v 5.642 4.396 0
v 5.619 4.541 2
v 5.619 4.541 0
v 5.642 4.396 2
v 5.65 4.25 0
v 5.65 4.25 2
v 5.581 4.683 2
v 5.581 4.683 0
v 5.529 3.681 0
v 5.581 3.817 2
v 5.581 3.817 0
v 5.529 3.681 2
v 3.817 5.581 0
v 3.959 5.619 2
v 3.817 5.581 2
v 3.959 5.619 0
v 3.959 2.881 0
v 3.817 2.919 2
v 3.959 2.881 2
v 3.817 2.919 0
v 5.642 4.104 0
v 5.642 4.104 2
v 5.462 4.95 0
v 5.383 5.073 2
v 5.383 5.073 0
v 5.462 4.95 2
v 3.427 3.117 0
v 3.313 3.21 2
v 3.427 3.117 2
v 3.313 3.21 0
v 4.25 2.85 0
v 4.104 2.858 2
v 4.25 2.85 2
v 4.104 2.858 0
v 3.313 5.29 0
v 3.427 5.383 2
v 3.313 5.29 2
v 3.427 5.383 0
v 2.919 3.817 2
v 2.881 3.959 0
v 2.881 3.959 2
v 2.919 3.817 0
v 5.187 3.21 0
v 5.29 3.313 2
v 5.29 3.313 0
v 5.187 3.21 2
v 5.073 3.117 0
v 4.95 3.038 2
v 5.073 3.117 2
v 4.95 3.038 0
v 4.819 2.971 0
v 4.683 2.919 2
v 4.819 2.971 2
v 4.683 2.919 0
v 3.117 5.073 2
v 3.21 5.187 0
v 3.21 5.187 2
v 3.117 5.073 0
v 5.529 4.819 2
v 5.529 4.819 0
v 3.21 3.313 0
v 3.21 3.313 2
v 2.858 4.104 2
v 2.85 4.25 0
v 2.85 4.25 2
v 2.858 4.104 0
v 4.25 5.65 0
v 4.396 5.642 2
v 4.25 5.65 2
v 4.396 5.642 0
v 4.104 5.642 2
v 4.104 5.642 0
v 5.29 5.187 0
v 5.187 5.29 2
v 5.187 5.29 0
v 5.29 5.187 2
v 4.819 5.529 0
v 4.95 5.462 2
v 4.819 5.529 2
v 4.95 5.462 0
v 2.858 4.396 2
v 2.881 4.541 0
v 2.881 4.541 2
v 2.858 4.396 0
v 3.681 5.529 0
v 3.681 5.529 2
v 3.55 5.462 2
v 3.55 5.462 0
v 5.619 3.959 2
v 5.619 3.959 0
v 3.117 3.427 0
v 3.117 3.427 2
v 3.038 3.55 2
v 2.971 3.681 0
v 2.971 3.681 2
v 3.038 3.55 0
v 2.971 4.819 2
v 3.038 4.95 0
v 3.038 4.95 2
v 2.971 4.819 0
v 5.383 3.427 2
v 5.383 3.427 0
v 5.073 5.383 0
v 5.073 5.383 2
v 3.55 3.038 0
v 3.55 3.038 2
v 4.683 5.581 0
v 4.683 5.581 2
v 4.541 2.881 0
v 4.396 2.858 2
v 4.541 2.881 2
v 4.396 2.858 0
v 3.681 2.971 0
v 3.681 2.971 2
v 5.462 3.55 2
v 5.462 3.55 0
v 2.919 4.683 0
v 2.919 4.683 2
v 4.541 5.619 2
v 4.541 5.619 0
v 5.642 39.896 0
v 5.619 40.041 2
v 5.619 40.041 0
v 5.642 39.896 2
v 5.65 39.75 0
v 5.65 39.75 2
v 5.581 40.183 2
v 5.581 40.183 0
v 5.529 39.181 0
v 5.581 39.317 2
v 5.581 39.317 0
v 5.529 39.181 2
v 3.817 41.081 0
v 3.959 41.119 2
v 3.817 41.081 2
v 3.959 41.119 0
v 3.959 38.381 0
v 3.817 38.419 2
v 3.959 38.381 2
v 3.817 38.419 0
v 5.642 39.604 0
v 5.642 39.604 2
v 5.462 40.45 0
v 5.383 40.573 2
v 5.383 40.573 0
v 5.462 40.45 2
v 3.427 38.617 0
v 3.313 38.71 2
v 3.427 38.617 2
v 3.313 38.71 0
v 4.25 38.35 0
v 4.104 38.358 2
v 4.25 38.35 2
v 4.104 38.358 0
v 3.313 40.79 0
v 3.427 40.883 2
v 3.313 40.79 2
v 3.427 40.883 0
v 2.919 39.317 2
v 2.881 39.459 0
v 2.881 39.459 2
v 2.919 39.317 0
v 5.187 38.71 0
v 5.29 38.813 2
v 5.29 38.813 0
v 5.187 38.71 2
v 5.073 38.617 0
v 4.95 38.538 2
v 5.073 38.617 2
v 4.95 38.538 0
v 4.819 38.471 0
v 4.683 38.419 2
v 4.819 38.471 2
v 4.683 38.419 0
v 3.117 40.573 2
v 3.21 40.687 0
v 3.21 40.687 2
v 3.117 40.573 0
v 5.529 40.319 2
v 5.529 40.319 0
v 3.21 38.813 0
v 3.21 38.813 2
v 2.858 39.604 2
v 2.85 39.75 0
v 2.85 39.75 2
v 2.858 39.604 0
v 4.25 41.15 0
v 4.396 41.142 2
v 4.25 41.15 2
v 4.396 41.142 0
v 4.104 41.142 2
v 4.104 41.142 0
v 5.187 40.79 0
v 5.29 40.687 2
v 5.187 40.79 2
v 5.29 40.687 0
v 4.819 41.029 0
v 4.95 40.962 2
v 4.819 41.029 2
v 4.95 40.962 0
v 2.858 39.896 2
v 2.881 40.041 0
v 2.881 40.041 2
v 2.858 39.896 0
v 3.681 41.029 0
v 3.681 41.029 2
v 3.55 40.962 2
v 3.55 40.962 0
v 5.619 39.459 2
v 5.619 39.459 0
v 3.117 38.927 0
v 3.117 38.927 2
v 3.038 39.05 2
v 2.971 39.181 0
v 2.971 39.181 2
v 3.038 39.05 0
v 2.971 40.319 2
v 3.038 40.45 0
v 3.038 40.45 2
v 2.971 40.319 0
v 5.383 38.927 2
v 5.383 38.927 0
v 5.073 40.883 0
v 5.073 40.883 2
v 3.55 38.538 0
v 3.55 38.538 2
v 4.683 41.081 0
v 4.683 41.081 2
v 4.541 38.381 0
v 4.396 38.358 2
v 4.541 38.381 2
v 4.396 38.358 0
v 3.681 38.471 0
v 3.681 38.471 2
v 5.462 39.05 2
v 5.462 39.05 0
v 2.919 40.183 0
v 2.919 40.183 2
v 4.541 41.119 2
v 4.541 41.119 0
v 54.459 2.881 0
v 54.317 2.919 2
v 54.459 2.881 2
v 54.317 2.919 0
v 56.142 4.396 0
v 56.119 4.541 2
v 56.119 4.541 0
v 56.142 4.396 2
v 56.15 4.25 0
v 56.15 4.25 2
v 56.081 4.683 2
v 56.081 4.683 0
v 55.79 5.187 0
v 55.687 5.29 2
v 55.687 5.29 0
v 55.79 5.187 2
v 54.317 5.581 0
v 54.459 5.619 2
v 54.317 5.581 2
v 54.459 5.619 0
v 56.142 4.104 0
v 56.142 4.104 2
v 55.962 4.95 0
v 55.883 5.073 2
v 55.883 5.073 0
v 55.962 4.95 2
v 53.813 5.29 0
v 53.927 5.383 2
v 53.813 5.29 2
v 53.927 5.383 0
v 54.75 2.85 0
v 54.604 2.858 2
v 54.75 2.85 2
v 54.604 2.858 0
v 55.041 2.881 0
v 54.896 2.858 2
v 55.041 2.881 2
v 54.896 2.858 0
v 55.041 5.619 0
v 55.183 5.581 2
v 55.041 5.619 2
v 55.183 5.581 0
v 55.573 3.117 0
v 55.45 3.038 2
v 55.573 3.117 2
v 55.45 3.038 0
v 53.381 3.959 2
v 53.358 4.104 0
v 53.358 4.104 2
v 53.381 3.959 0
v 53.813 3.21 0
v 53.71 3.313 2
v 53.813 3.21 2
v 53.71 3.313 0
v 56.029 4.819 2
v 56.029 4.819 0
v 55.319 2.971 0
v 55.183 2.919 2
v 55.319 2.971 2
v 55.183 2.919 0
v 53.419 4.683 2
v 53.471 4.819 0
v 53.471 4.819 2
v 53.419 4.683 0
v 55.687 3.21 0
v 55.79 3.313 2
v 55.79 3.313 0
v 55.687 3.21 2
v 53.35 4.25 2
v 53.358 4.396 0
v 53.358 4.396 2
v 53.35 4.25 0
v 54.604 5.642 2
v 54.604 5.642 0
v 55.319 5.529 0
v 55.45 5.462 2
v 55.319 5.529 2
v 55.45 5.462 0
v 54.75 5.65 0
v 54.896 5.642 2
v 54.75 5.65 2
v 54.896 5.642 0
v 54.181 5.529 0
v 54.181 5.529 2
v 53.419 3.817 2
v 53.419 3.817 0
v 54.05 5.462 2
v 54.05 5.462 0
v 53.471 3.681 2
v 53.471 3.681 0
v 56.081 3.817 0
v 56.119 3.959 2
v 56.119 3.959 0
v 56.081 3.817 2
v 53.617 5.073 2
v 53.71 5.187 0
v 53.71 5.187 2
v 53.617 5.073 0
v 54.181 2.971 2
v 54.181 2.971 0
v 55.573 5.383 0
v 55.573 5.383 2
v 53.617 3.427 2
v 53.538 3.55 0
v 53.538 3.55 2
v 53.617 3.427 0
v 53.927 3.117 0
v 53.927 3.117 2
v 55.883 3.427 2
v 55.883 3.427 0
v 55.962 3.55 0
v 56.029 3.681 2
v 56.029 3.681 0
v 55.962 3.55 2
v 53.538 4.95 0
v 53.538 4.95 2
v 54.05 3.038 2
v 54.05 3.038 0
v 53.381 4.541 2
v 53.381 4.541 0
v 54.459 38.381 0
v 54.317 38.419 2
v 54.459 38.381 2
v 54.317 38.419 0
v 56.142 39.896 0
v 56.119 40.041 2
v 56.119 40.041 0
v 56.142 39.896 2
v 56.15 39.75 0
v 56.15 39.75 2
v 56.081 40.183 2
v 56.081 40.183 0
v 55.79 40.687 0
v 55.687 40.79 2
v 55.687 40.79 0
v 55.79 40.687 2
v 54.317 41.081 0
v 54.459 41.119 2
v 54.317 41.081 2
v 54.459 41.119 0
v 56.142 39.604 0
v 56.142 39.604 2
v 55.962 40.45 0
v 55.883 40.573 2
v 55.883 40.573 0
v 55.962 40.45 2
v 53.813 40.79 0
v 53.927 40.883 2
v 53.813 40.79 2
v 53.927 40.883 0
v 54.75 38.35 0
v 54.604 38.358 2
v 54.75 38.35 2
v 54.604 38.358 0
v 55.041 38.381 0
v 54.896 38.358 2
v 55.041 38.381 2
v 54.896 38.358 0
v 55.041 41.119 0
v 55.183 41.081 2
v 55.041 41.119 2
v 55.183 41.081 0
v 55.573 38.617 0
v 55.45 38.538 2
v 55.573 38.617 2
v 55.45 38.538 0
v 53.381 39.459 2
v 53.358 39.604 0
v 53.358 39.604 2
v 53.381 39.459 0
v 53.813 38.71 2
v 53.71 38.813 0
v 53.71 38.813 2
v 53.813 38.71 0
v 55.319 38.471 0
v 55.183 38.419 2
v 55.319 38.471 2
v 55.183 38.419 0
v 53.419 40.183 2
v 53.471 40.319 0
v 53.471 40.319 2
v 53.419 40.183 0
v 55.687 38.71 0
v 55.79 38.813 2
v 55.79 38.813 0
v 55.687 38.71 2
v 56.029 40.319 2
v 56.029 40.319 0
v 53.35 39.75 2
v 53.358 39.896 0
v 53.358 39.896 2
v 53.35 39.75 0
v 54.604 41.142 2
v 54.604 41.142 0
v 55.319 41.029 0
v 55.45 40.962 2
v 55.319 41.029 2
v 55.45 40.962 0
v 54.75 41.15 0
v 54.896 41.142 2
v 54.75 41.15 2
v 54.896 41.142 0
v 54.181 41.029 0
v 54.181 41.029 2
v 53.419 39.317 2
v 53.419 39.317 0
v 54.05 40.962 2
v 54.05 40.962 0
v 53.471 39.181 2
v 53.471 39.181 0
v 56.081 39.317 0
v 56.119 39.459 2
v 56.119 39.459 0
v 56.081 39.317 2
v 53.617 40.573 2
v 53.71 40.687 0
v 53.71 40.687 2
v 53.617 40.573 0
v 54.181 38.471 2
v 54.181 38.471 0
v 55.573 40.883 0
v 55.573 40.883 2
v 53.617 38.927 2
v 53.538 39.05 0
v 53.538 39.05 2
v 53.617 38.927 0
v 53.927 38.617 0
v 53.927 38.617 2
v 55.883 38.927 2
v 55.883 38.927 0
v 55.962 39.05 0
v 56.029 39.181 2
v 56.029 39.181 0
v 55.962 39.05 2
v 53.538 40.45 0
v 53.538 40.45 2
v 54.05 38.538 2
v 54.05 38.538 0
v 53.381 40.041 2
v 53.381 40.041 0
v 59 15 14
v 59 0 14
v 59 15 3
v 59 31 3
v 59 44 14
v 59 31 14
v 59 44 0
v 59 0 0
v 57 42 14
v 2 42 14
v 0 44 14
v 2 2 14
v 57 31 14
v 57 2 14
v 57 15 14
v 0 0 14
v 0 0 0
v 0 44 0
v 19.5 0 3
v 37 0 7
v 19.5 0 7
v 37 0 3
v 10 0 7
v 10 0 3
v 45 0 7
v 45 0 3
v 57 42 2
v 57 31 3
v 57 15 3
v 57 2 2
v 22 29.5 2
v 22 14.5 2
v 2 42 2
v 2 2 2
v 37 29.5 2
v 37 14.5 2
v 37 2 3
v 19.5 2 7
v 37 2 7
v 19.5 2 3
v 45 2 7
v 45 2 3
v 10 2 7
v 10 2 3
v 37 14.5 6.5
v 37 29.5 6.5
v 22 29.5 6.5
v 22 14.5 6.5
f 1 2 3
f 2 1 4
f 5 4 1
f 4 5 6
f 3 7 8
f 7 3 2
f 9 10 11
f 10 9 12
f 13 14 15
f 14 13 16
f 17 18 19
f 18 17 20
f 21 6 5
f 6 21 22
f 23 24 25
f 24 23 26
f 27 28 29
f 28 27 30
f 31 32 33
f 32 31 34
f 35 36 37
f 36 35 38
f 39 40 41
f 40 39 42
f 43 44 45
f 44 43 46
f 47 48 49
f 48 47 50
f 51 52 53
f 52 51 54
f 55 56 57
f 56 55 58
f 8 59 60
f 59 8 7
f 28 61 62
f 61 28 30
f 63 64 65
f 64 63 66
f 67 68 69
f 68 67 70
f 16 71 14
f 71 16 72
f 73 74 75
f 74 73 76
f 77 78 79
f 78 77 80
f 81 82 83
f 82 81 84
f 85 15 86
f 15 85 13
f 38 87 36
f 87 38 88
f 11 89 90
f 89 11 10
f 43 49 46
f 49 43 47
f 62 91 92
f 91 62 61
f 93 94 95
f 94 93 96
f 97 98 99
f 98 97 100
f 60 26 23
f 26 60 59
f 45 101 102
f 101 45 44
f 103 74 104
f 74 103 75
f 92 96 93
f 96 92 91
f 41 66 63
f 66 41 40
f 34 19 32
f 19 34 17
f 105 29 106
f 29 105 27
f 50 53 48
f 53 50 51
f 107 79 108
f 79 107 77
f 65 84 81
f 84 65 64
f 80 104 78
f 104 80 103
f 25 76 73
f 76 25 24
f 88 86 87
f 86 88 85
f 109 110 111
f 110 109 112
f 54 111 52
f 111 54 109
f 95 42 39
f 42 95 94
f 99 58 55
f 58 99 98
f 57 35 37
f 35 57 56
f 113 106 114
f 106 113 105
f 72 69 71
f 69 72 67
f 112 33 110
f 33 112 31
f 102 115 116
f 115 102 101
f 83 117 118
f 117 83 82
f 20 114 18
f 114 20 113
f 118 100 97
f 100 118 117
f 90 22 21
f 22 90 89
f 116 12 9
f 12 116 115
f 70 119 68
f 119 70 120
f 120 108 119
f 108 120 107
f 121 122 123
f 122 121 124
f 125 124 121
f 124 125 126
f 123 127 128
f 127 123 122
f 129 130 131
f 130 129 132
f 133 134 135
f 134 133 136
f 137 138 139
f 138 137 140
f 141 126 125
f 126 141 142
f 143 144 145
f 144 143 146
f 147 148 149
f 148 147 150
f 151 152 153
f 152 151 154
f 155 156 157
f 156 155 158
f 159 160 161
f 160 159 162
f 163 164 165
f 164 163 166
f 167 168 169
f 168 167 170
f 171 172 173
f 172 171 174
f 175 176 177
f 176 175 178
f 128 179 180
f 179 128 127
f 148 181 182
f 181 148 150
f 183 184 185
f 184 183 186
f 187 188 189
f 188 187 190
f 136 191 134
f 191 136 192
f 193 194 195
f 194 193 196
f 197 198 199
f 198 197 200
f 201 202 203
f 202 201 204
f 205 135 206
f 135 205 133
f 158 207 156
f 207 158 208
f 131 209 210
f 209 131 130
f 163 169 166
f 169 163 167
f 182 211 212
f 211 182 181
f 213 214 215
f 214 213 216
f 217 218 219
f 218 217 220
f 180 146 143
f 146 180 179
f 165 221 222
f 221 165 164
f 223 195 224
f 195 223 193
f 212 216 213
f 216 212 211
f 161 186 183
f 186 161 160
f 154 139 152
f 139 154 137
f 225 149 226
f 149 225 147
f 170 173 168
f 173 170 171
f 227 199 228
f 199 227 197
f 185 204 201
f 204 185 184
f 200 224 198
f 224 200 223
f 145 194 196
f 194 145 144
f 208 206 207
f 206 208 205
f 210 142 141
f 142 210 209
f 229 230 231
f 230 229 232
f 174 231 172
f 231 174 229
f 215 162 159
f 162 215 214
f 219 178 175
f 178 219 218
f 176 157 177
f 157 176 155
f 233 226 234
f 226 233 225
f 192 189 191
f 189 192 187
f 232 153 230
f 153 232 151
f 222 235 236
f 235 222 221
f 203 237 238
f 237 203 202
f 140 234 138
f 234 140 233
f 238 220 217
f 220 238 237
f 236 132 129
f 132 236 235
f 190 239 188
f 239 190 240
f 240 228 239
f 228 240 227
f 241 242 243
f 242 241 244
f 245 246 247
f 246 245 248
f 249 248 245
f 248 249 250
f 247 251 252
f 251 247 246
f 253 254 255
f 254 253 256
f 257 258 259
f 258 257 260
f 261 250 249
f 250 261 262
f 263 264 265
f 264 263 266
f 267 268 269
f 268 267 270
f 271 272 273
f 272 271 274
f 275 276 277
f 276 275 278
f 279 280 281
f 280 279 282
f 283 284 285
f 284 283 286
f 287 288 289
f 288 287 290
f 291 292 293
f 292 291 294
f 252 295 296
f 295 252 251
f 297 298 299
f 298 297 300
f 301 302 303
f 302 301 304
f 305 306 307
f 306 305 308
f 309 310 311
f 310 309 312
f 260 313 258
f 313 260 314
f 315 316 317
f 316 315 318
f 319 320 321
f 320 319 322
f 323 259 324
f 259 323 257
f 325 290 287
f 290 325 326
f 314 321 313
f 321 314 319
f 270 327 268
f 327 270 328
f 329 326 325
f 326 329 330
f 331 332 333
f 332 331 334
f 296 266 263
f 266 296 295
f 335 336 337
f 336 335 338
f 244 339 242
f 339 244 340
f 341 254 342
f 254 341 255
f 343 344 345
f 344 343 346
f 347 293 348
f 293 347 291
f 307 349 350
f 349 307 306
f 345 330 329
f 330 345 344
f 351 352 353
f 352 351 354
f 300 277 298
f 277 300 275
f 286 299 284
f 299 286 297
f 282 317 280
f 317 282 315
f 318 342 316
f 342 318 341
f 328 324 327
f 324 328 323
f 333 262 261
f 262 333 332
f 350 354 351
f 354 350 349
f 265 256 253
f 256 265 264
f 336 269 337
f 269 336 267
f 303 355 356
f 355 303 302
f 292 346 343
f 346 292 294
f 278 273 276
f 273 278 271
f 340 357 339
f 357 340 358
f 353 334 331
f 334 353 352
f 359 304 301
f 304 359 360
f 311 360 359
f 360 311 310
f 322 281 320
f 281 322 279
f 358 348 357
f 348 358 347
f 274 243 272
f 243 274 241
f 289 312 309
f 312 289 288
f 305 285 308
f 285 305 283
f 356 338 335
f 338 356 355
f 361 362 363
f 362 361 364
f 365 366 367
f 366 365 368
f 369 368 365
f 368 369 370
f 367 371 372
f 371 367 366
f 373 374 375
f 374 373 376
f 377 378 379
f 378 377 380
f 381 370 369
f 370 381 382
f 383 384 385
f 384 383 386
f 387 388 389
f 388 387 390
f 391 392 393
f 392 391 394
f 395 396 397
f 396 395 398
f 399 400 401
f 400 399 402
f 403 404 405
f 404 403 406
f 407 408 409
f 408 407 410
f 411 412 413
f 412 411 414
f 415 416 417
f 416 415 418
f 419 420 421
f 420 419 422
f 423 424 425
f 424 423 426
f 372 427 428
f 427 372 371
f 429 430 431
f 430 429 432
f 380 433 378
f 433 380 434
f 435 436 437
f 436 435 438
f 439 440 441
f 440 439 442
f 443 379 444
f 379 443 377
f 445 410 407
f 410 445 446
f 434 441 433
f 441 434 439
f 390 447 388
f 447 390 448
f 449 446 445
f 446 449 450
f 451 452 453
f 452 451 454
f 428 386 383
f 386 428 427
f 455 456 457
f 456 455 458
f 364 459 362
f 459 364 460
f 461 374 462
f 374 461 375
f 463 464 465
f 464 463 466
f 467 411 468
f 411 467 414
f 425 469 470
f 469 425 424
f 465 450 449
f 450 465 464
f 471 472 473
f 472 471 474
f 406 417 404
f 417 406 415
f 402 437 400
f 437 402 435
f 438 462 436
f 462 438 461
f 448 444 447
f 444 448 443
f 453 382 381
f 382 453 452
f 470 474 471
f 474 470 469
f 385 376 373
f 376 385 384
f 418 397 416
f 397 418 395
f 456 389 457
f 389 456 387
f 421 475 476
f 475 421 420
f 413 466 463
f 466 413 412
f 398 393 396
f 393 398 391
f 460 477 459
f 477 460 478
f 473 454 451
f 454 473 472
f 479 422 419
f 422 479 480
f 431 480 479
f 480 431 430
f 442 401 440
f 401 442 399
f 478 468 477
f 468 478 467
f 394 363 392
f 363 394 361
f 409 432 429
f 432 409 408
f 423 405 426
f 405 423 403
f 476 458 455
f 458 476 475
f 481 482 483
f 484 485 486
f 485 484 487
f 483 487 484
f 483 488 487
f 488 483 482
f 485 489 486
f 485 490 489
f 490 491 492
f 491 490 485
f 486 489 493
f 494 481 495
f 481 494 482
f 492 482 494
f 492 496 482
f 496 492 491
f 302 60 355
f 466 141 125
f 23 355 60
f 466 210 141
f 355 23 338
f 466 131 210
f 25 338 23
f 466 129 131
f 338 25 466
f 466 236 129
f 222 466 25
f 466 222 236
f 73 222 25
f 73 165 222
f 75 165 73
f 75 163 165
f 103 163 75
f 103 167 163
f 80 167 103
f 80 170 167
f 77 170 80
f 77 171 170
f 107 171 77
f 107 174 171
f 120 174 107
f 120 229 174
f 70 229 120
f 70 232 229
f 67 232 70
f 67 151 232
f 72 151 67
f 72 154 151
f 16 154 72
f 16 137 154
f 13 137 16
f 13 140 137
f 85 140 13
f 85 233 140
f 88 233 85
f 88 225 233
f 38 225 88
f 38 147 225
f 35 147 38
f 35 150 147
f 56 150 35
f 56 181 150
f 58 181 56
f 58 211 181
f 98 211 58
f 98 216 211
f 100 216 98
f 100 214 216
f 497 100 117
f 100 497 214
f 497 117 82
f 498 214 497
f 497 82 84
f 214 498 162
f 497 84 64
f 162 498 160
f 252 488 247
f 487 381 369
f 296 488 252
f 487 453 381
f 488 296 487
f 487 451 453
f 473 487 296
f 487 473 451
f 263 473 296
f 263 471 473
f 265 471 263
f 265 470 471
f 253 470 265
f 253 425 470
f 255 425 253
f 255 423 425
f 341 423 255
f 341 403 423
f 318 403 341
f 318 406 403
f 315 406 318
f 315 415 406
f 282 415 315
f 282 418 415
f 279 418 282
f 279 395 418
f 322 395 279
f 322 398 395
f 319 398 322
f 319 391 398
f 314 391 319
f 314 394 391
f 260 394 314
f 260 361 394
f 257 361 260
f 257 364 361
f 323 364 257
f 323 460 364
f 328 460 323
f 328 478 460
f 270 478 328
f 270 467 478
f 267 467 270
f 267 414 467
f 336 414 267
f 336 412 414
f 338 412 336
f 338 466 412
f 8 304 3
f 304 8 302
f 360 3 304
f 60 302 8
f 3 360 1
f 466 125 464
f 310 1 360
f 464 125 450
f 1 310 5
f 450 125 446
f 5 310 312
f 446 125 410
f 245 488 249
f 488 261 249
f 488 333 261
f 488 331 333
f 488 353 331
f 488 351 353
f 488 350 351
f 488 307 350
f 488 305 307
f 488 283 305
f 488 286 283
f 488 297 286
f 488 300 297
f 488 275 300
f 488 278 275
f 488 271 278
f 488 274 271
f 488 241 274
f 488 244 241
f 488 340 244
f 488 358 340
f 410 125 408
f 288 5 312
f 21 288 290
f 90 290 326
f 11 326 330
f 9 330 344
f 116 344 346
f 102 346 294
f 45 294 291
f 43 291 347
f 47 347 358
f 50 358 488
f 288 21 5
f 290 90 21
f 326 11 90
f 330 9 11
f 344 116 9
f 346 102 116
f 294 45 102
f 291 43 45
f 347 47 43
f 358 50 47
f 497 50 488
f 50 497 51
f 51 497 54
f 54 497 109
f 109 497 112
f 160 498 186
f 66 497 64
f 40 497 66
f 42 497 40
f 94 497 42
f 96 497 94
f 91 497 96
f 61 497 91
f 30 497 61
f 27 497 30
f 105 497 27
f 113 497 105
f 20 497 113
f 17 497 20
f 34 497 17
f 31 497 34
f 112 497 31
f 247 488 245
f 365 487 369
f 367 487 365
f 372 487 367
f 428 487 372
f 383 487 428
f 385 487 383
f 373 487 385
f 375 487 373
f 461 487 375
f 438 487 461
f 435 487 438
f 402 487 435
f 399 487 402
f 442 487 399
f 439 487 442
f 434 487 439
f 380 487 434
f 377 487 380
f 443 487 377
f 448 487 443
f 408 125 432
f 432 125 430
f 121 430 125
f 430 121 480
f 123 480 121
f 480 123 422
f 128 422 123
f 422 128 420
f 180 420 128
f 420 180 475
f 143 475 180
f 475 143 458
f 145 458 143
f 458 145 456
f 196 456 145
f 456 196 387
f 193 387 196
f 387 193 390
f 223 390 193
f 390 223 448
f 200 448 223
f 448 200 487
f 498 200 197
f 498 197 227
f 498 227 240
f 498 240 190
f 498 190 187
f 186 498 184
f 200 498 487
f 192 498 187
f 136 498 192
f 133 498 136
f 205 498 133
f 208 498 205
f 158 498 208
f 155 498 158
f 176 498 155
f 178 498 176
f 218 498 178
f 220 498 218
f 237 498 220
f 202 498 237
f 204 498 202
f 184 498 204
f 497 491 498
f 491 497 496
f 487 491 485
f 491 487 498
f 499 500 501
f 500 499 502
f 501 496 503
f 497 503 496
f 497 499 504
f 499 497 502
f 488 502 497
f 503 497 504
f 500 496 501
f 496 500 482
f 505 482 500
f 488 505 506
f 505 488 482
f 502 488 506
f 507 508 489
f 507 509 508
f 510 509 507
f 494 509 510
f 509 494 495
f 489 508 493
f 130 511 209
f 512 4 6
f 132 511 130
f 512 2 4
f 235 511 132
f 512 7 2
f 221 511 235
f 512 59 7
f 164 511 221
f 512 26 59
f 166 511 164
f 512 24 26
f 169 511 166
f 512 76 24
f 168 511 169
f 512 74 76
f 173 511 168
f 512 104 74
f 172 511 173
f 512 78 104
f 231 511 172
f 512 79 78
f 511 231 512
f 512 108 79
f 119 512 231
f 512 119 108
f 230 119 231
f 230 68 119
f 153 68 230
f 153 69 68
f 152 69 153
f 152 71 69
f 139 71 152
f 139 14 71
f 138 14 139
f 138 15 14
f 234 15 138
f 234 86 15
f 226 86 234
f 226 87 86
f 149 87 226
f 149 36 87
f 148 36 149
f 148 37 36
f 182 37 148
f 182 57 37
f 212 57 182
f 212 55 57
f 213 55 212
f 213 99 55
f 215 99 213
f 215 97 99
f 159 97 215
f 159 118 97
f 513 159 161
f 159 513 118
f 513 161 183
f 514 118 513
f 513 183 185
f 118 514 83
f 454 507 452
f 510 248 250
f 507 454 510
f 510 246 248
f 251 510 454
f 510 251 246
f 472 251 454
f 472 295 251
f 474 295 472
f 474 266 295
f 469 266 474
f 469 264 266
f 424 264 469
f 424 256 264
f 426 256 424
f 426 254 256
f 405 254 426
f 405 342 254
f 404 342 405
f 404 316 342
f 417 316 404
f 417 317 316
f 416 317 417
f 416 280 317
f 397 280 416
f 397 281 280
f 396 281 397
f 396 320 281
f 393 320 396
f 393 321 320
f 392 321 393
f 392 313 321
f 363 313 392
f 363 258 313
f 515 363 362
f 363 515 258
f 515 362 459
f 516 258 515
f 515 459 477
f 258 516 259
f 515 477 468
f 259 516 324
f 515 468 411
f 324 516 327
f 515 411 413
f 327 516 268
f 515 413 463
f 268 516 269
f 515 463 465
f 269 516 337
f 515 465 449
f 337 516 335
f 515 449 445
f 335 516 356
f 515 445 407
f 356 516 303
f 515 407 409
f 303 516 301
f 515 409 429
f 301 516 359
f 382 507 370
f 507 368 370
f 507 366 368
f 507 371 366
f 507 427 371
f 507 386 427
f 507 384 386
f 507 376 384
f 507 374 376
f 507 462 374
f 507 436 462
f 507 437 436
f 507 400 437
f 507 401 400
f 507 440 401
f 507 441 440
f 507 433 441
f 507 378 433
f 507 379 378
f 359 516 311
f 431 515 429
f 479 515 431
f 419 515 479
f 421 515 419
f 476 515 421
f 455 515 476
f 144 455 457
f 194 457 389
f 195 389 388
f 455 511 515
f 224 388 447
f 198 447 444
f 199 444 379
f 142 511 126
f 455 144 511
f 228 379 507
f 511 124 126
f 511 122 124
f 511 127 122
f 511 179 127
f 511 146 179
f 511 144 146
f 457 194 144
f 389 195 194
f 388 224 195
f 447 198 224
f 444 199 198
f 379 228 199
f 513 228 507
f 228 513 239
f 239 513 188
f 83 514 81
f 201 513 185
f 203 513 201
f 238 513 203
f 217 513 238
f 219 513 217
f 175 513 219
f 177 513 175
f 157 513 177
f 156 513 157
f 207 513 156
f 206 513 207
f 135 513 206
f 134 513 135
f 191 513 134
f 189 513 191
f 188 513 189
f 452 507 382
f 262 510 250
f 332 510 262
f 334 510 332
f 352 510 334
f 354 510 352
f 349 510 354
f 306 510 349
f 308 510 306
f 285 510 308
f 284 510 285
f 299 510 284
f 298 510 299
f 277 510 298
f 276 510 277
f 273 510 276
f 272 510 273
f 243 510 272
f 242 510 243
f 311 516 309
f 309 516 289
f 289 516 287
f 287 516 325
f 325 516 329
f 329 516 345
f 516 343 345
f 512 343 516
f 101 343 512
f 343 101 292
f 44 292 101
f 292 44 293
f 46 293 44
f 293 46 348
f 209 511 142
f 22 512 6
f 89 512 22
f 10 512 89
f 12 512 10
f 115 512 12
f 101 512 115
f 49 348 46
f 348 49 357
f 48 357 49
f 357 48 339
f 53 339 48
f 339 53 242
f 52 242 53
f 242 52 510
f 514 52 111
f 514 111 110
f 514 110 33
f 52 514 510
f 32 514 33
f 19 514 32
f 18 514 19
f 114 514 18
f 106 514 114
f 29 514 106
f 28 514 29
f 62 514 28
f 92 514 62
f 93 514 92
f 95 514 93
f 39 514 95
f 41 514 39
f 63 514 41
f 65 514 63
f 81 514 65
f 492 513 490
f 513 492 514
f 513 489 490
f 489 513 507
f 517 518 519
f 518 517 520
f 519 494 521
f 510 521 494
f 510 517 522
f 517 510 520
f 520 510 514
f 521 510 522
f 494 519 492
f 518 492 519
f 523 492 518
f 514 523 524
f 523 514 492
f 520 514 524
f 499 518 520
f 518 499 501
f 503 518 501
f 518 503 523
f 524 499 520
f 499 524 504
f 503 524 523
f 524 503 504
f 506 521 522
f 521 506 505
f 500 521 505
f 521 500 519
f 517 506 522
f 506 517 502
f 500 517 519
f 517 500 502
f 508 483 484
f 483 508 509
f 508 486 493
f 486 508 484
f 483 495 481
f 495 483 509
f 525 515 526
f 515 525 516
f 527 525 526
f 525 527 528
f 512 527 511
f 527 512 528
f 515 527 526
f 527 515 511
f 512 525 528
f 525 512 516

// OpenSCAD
// Radxa CM4 Active Armor Enclosure & Heatsink
// Precision CNC Milled 6061-T6 Aluminum Case
// Outer boundary: 59.0 x 44.0 x 14.0 mm (snug fit for 55.0 x 40.0 mm carrier)

$fn = 60;
board_w = 55.0;
board_h = 40.0;
wall_t = 2.0;
case_w = board_w + 2*wall_t;
case_h = board_h + 2*wall_t;
case_z = 14.0;

module case_base() {
    difference() {
        cube([case_w, case_h, case_z]);
        translate([wall_t, wall_t, 2.0])
            cube([board_w, board_h, case_z]);
        for (x = [wall_t + 2.25, wall_t + 52.75]) {
            for (y = [wall_t + 2.25, wall_t + 37.75]) {
                translate([x, y, -1])
                    cylinder(d=2.8, h=case_z+2);
            }
        }
        translate([wall_t + 8.0, -1, 3.0])
            cube([9.5, wall_t + 2, 4.0]); // USB-C
        translate([wall_t + 35.0, -1, 3.0])
            cube([8.0, wall_t + 2, 4.0]); // HDMI
        translate([case_w - wall_t - 1, wall_t + 13.0, 3.0])
            cube([wall_t + 2, 16.0, 11.0]); // RJ45
    }
    // Thermal cooling pillars for SoC (RK3566/RK3588)
    translate([case_w/2 - 7.5, case_h/2 - 7.5, 2.0])
        cube([15.0, 15.0, 4.5]);
}

case_base();
